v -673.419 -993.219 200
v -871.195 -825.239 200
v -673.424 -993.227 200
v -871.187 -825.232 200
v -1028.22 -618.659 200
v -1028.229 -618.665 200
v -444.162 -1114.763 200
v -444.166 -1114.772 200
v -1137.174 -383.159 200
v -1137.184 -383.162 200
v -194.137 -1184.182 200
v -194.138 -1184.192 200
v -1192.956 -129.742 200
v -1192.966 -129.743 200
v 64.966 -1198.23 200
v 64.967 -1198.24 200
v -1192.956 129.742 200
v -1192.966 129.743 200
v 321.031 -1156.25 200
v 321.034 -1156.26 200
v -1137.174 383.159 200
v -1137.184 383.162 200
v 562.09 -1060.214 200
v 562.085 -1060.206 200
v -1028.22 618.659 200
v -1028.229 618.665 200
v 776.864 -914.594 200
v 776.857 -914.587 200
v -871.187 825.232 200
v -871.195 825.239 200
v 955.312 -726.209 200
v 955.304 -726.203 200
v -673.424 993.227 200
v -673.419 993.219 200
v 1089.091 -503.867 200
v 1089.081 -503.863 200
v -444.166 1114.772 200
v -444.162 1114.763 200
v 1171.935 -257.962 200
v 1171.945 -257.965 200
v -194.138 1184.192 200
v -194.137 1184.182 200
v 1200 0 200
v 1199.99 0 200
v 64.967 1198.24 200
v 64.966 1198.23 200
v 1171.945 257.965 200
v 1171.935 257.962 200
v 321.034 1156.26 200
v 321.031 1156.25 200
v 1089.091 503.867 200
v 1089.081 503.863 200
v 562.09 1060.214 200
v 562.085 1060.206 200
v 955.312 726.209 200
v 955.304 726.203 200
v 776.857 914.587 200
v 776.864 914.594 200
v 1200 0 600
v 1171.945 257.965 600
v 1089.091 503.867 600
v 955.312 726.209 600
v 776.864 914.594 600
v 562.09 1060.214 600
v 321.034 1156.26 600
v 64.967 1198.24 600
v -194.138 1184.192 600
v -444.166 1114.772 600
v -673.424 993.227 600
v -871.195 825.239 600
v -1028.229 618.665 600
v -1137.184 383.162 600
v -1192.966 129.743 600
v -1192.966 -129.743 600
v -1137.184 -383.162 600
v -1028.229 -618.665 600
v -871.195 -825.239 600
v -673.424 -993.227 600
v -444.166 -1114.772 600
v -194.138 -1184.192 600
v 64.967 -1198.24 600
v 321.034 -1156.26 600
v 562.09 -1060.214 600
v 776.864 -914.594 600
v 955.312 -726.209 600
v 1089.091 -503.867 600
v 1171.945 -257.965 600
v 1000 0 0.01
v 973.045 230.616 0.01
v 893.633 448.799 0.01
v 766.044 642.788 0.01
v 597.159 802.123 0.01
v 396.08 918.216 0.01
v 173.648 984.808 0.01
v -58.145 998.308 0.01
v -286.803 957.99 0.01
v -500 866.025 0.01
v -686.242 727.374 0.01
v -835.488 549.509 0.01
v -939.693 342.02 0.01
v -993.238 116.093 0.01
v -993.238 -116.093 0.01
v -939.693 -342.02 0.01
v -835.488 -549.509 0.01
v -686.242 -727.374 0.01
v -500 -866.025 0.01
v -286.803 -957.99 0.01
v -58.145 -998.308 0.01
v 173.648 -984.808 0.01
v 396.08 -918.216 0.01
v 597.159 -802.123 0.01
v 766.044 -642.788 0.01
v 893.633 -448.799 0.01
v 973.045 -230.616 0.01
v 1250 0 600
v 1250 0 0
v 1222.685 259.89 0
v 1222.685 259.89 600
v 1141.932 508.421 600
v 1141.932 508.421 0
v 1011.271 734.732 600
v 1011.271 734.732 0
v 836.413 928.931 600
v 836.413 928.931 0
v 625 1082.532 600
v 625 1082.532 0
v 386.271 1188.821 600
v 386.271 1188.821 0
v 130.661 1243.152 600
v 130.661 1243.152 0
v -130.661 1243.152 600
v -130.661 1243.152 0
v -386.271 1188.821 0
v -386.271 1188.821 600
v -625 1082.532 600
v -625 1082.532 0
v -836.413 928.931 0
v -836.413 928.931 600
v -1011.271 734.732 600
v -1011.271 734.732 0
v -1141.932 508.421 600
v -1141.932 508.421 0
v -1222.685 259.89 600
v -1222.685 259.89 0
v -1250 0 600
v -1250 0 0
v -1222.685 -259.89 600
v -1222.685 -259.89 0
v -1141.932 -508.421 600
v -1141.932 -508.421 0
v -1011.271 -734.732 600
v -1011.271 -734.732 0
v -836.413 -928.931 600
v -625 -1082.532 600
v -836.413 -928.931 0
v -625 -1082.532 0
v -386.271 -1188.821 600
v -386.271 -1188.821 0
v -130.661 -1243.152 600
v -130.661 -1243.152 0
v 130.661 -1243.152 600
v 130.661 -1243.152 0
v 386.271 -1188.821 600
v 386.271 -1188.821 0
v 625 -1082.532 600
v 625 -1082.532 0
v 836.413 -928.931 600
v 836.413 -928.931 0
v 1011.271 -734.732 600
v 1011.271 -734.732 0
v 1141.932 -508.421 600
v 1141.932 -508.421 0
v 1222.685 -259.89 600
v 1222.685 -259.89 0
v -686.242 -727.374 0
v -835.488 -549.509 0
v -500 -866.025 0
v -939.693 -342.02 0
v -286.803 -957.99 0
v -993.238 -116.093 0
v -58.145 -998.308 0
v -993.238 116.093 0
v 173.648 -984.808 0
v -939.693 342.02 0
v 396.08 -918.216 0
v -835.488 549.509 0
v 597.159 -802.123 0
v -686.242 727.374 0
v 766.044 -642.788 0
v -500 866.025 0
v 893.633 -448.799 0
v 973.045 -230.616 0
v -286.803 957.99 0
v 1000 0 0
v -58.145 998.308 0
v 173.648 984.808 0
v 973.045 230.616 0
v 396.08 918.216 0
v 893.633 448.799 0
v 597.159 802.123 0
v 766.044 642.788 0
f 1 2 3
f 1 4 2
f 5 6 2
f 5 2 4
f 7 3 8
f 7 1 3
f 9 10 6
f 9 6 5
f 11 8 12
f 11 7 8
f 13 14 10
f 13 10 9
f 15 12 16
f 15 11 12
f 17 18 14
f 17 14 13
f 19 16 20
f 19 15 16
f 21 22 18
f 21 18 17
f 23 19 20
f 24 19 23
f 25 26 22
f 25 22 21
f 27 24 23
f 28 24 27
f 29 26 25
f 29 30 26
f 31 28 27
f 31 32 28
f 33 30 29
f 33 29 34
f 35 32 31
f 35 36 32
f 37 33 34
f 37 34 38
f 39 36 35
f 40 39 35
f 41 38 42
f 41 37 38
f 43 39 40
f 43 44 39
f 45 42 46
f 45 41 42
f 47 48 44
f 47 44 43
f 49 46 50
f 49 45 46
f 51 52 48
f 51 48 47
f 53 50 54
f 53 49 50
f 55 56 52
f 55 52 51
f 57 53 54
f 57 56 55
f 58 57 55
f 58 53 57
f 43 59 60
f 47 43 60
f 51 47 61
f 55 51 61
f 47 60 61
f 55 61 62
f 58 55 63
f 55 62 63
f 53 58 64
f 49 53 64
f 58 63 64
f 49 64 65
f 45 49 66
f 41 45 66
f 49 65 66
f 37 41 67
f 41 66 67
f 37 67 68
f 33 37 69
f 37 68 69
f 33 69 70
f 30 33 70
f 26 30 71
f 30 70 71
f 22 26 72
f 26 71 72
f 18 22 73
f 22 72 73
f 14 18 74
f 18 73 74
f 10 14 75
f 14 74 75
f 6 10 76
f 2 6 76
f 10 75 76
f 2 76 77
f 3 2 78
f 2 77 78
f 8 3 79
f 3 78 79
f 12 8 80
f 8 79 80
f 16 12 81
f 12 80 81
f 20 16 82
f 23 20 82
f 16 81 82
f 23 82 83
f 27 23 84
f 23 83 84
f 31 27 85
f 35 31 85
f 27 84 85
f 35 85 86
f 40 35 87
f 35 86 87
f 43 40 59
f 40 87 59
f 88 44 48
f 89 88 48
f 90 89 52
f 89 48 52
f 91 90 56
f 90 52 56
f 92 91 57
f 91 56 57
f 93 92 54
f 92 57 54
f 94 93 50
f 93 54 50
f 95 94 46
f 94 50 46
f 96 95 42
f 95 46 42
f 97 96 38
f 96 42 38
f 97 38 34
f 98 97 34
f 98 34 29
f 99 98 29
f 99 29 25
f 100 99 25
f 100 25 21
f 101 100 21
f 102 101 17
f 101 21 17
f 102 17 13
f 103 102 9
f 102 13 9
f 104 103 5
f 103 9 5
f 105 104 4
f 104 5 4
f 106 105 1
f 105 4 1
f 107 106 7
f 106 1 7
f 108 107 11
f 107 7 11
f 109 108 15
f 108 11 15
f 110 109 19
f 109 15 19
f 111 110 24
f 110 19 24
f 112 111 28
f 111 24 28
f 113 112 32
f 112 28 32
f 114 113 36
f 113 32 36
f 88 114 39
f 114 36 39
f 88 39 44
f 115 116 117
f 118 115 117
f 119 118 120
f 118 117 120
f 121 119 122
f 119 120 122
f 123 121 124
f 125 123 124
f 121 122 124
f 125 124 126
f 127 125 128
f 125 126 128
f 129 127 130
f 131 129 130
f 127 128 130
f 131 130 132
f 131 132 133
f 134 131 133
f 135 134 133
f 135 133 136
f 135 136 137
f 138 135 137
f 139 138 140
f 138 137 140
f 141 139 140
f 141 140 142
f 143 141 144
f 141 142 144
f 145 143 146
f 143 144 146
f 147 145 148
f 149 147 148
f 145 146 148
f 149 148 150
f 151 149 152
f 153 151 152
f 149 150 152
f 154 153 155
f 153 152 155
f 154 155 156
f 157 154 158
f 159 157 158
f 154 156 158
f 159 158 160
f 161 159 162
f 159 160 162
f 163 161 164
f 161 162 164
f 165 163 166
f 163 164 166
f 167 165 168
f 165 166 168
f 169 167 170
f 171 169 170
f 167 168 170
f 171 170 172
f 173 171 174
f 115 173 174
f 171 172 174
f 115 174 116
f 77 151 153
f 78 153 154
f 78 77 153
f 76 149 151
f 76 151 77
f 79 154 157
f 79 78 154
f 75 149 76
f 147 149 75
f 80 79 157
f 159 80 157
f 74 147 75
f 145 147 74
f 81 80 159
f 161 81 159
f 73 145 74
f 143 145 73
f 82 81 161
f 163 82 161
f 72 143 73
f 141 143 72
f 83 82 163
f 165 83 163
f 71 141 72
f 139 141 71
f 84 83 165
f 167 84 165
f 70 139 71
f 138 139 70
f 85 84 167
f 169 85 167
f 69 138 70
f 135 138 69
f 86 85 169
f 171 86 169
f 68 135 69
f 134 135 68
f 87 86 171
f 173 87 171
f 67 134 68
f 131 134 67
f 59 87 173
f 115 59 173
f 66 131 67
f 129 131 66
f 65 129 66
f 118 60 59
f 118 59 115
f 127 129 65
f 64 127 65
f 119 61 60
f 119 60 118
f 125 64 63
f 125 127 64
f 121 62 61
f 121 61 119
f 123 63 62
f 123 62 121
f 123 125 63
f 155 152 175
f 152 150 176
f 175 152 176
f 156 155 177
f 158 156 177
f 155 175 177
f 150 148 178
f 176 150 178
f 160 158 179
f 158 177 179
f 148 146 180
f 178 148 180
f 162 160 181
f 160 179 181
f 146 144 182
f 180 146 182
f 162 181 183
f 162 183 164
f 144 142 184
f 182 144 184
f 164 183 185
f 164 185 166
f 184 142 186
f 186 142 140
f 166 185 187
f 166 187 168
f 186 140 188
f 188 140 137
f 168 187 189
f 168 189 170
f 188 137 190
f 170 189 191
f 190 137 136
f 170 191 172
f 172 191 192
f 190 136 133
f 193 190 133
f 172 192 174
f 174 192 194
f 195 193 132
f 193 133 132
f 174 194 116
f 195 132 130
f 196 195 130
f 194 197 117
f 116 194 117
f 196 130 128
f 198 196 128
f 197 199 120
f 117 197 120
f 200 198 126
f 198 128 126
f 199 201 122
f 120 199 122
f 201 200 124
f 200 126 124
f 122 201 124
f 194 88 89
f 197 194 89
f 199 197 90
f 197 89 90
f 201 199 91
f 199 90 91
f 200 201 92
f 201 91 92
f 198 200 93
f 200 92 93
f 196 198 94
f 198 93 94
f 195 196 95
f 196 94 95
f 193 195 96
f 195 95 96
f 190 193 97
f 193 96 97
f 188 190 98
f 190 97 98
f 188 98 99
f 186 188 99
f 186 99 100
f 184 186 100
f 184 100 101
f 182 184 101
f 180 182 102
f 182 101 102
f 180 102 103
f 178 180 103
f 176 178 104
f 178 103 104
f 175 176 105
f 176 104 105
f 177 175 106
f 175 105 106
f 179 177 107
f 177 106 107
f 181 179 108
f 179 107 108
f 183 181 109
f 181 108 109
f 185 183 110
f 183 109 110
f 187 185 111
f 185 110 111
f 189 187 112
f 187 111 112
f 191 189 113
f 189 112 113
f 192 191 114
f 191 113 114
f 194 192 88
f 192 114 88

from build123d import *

# Parameters (mm, degrees)
CYLINDER_R      = 1250
CYLINDER_DEPTH  = 600
SKETCH001_R     = 1200
POCKET_DEPTH    = 400
SKETCH_R        = 1000
POCKET001_DEPTH = 200
CHAMFER_SIZE    = 199.99


with BuildPart() as part:
    # Cylinder → Cylinder (new body)
    with BuildSketch(Plane.XY):
        Circle(CYLINDER_R)
    extrude(amount=CYLINDER_DEPTH)

    # Sketch001 → Pocket (cut)
    with BuildSketch(Plane.XY.offset(600)):
        Circle(SKETCH001_R)
    extrude(amount=-POCKET_DEPTH, mode=Mode.SUBTRACT)

    # Sketch → Pocket001 (cut)
    with BuildSketch(Plane.XY.offset(200)):
        Circle(SKETCH_R)
    extrude(amount=-POCKET001_DEPTH, mode=Mode.SUBTRACT)

    # Chamfer
    chamfer_edges = [part.edges().sort_by_distance(p)[0] for p in [
        (-1000, 0, 200),
    ]]
    chamfer(chamfer_edges, length=CHAMFER_SIZE)


solid = part.part
